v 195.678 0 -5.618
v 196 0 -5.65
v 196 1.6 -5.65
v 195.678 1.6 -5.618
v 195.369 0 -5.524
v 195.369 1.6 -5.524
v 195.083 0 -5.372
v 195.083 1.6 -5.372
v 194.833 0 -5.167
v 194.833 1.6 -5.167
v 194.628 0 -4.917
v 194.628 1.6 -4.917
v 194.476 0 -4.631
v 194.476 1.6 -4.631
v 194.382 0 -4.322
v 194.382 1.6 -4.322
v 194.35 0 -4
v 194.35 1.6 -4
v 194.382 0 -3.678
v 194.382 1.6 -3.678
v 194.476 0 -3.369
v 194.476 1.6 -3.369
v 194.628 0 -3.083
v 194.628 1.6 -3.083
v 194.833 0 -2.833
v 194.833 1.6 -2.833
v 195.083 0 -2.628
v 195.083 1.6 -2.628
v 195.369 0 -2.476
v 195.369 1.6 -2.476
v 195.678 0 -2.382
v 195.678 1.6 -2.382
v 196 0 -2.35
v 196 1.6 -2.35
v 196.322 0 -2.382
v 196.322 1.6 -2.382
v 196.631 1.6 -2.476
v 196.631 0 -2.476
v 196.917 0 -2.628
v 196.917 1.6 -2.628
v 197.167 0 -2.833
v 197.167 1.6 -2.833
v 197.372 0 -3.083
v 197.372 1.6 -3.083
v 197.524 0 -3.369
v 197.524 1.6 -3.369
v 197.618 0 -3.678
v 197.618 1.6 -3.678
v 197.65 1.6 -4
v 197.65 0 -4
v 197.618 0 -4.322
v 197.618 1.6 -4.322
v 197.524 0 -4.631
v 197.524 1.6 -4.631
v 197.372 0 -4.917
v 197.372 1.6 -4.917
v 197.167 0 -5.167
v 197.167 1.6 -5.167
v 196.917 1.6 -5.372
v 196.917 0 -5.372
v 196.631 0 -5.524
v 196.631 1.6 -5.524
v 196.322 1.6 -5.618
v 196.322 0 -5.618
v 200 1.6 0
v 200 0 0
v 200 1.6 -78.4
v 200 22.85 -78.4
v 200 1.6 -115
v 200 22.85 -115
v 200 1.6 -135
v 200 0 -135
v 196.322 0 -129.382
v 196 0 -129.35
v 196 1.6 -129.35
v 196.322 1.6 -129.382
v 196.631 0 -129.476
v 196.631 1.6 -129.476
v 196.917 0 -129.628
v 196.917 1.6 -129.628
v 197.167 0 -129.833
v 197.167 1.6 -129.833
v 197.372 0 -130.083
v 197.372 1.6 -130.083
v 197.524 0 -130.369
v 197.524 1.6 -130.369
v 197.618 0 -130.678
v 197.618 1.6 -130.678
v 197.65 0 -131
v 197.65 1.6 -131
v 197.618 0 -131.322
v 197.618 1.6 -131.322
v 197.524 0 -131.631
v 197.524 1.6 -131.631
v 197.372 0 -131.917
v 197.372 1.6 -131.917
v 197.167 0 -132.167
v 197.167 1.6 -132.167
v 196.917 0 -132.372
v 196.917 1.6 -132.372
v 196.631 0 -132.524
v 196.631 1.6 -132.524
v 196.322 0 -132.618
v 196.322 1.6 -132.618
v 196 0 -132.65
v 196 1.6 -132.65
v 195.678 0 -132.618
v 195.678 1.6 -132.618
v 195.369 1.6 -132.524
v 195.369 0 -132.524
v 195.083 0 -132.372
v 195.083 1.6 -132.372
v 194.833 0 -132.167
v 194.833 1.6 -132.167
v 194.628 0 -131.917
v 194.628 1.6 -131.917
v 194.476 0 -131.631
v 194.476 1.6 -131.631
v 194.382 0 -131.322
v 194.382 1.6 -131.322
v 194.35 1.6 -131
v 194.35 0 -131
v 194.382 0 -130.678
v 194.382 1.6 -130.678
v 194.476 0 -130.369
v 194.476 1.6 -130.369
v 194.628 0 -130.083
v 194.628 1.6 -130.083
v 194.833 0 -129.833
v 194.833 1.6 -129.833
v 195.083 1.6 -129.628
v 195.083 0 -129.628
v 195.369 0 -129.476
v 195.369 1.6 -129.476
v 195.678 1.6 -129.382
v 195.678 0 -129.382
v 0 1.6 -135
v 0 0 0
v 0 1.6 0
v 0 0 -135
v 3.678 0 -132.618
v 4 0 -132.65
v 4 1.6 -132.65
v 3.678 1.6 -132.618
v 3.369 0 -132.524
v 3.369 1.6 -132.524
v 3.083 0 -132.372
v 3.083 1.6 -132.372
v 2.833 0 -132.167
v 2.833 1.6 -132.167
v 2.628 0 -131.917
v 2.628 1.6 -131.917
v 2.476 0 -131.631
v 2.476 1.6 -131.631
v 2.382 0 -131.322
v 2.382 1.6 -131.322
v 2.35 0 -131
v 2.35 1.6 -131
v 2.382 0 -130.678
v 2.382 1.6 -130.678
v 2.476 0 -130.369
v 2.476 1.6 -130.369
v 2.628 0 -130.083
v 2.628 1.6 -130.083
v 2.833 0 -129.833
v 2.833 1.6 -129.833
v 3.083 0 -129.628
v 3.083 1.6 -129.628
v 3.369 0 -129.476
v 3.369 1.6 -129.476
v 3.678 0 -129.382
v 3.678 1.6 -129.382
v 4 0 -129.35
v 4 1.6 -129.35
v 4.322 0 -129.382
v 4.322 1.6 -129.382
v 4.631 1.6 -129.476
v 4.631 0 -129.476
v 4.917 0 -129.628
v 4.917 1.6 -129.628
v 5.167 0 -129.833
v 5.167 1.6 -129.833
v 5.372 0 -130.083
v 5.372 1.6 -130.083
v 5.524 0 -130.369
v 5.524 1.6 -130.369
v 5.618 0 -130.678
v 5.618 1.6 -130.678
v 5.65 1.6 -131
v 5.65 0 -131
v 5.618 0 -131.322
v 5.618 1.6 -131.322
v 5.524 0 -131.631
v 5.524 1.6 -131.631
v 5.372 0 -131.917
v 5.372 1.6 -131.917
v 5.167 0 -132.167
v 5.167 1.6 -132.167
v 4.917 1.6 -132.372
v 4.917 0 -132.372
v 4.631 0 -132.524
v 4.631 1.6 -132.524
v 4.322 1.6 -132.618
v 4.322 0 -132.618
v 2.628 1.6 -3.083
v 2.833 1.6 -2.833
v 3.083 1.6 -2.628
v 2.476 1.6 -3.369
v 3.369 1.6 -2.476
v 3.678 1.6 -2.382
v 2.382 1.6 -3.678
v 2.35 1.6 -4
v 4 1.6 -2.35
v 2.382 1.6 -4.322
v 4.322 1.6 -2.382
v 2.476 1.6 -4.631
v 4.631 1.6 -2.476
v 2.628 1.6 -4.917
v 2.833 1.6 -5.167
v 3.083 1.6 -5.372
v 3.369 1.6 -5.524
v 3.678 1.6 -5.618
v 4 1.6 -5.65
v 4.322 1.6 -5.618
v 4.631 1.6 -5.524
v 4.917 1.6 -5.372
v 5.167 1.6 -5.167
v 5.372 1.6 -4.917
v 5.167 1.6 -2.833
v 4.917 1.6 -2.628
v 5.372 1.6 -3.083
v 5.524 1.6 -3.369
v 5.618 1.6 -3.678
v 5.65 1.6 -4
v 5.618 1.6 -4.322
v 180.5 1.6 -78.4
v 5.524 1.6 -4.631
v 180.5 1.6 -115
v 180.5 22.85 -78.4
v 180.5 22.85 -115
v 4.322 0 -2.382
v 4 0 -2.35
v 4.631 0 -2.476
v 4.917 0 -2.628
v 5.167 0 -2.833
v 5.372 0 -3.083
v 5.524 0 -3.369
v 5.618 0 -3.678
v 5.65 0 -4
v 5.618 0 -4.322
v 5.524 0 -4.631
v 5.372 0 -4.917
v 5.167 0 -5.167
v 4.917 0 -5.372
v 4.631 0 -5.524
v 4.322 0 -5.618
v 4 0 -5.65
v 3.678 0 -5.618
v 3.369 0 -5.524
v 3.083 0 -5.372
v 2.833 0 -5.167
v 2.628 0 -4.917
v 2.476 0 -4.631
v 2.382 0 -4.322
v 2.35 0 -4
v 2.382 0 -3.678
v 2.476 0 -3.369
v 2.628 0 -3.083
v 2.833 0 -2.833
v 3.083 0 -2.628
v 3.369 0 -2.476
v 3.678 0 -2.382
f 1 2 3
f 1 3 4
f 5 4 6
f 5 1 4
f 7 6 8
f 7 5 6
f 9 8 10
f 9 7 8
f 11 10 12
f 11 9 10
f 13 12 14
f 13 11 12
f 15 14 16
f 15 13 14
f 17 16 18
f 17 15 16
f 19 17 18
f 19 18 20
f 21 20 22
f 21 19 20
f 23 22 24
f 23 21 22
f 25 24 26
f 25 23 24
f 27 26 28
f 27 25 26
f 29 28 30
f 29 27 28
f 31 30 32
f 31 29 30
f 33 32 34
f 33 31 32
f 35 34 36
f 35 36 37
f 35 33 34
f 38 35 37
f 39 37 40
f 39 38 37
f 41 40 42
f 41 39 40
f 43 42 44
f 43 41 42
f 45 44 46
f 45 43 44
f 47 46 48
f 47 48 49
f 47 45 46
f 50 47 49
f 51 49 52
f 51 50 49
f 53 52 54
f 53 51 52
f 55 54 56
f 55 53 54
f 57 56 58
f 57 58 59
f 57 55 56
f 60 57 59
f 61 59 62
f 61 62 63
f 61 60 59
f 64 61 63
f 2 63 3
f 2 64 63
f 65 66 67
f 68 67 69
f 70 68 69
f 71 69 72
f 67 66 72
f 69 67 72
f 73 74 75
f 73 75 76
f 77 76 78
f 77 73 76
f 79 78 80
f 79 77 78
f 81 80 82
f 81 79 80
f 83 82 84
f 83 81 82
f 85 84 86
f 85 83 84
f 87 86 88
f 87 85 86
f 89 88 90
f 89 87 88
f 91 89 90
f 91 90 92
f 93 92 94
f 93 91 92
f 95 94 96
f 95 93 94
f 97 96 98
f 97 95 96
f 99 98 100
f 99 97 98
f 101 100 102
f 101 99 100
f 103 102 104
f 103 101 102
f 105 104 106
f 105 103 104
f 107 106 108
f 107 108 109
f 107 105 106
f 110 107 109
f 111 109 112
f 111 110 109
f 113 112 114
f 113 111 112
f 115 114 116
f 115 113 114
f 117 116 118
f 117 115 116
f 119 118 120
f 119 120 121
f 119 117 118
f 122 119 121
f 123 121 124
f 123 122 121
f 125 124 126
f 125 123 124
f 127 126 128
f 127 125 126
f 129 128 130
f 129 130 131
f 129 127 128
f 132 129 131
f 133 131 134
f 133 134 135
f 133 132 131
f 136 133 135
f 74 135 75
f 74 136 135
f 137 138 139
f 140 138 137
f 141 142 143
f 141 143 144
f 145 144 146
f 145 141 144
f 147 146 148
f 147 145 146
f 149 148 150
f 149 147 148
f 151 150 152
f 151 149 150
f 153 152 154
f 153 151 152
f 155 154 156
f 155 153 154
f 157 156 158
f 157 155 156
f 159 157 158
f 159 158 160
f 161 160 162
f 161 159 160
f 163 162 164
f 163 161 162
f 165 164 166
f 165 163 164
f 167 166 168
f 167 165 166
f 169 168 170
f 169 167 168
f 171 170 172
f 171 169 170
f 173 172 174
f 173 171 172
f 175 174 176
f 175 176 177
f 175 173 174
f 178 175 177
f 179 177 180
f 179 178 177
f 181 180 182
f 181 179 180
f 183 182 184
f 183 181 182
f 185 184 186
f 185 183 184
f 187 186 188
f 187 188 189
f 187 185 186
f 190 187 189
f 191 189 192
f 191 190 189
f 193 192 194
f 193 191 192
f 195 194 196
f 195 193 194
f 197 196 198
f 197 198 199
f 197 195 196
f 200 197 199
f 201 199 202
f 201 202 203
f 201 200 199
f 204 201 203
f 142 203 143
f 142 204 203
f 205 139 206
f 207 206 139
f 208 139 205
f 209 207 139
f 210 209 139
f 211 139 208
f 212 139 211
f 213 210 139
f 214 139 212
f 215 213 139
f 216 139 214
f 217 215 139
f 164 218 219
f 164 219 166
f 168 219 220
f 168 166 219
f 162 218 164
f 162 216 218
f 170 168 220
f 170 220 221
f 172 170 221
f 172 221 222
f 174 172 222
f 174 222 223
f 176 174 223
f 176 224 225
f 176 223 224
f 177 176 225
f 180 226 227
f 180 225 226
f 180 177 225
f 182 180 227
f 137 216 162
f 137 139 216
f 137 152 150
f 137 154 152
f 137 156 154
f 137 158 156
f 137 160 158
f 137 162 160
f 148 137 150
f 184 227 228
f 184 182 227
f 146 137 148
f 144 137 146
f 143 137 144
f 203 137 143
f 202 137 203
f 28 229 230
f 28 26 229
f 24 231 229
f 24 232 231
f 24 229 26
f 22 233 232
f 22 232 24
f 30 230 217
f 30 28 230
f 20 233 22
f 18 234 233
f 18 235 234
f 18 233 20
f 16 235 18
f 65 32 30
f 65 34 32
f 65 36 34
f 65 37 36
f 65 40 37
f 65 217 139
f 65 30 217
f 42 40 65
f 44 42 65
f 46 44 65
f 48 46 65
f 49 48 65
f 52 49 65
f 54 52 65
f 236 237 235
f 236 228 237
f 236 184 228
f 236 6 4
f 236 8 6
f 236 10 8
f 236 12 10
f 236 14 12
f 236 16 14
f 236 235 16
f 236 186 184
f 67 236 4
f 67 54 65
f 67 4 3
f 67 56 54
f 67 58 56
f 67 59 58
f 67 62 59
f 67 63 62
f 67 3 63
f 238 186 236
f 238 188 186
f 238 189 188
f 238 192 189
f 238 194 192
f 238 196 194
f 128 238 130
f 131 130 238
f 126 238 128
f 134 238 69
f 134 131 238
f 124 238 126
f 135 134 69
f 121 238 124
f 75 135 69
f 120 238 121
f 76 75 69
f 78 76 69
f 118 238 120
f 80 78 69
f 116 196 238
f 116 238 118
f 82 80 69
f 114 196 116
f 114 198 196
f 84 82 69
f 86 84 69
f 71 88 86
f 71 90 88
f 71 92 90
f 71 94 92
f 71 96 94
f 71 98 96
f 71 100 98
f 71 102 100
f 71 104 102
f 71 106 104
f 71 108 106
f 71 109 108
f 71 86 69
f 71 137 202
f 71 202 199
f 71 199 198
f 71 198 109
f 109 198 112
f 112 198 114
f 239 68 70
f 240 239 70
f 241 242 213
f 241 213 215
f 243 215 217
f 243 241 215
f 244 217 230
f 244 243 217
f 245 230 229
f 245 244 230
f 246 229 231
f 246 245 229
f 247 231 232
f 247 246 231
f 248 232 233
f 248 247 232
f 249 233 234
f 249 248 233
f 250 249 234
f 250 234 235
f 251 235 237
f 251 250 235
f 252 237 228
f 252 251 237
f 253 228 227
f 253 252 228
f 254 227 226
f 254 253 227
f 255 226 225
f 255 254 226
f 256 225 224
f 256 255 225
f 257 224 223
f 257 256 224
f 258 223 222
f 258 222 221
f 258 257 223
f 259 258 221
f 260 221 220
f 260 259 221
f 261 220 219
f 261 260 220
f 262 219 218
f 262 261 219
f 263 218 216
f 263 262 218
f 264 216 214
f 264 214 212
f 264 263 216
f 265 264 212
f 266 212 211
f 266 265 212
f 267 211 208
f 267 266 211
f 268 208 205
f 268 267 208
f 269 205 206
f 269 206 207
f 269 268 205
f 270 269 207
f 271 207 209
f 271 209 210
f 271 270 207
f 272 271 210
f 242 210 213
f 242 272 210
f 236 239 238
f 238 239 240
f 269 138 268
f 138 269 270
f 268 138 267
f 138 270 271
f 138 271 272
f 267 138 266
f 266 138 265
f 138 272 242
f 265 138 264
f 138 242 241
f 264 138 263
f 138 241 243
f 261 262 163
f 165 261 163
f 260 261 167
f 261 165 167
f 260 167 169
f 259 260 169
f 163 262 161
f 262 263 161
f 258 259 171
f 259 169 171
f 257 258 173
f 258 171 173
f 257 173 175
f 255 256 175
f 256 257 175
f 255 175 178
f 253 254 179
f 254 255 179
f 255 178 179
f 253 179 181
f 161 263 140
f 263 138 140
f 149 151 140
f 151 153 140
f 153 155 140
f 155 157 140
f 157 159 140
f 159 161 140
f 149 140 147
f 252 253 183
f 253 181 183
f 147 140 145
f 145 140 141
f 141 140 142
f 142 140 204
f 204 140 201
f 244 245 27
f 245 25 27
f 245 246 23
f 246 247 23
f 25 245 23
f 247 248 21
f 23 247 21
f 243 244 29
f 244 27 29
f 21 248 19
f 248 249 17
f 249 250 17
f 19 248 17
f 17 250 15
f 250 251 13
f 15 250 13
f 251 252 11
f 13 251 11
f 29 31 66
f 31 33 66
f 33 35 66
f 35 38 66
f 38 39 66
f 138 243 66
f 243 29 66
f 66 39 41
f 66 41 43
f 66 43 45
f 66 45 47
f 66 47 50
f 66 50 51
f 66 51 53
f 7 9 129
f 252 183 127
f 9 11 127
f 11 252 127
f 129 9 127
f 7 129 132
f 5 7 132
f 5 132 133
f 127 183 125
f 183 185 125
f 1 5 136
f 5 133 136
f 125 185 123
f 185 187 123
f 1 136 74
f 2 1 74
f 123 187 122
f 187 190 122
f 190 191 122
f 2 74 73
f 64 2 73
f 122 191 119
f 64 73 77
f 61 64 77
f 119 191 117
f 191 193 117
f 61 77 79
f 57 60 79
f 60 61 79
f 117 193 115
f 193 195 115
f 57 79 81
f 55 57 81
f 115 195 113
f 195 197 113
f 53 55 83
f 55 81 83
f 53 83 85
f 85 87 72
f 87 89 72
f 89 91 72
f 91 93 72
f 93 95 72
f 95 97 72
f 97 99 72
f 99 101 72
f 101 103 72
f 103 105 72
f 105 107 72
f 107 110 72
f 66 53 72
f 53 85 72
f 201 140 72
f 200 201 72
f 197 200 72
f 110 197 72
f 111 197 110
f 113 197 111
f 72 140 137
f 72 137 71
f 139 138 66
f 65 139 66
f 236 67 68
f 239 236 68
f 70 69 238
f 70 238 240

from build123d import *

# Parameters (mm, degrees)
SKETCH1_W           = 200
SKETCH1_H           = 135
SKETCH1_R           = 1.65
BOSS_EXTRUDE1_DEPTH = 1.6
SKETCH2_W           = 36.6
SKETCH2_H           = 21.25
BOSS_EXTRUDE2_DEPTH = 19.5


with BuildPart() as part:
    # Sketch1 → Boss-Extrude1 (new body)
    with BuildSketch(Plane(origin=(0, 0, 0), x_dir=(1, 0, 0), z_dir=(0, 1, 0))):
        with Locations((100, 67.5)):
            Rectangle(SKETCH1_W, SKETCH1_H)
        with Locations(Location((196, 131, 0), (0, 0, 270))):
            Circle(SKETCH1_R, mode=Mode.SUBTRACT)
        with Locations(Location((4, 131, 0), (0, 0, 90))):
            Circle(SKETCH1_R, mode=Mode.SUBTRACT)
        with Locations(Location((4, 4, 0), (0, 0, 270))):
            Circle(SKETCH1_R, mode=Mode.SUBTRACT)
        with Locations(Location((196, 4, 0), (0, 0, 90))):
            Circle(SKETCH1_R, mode=Mode.SUBTRACT)
    extrude(amount=BOSS_EXTRUDE1_DEPTH)

    # Sketch2 → Boss-Extrude2 (add)
    with BuildSketch(Plane(origin=(200, 0, 0), x_dir=(0, 0, -1), z_dir=(1, 0, 0))):
        with Locations((96.7, 12.225)):
            Rectangle(SKETCH2_W, SKETCH2_H)
    extrude(amount=-BOSS_EXTRUDE2_DEPTH)


solid = part.part
